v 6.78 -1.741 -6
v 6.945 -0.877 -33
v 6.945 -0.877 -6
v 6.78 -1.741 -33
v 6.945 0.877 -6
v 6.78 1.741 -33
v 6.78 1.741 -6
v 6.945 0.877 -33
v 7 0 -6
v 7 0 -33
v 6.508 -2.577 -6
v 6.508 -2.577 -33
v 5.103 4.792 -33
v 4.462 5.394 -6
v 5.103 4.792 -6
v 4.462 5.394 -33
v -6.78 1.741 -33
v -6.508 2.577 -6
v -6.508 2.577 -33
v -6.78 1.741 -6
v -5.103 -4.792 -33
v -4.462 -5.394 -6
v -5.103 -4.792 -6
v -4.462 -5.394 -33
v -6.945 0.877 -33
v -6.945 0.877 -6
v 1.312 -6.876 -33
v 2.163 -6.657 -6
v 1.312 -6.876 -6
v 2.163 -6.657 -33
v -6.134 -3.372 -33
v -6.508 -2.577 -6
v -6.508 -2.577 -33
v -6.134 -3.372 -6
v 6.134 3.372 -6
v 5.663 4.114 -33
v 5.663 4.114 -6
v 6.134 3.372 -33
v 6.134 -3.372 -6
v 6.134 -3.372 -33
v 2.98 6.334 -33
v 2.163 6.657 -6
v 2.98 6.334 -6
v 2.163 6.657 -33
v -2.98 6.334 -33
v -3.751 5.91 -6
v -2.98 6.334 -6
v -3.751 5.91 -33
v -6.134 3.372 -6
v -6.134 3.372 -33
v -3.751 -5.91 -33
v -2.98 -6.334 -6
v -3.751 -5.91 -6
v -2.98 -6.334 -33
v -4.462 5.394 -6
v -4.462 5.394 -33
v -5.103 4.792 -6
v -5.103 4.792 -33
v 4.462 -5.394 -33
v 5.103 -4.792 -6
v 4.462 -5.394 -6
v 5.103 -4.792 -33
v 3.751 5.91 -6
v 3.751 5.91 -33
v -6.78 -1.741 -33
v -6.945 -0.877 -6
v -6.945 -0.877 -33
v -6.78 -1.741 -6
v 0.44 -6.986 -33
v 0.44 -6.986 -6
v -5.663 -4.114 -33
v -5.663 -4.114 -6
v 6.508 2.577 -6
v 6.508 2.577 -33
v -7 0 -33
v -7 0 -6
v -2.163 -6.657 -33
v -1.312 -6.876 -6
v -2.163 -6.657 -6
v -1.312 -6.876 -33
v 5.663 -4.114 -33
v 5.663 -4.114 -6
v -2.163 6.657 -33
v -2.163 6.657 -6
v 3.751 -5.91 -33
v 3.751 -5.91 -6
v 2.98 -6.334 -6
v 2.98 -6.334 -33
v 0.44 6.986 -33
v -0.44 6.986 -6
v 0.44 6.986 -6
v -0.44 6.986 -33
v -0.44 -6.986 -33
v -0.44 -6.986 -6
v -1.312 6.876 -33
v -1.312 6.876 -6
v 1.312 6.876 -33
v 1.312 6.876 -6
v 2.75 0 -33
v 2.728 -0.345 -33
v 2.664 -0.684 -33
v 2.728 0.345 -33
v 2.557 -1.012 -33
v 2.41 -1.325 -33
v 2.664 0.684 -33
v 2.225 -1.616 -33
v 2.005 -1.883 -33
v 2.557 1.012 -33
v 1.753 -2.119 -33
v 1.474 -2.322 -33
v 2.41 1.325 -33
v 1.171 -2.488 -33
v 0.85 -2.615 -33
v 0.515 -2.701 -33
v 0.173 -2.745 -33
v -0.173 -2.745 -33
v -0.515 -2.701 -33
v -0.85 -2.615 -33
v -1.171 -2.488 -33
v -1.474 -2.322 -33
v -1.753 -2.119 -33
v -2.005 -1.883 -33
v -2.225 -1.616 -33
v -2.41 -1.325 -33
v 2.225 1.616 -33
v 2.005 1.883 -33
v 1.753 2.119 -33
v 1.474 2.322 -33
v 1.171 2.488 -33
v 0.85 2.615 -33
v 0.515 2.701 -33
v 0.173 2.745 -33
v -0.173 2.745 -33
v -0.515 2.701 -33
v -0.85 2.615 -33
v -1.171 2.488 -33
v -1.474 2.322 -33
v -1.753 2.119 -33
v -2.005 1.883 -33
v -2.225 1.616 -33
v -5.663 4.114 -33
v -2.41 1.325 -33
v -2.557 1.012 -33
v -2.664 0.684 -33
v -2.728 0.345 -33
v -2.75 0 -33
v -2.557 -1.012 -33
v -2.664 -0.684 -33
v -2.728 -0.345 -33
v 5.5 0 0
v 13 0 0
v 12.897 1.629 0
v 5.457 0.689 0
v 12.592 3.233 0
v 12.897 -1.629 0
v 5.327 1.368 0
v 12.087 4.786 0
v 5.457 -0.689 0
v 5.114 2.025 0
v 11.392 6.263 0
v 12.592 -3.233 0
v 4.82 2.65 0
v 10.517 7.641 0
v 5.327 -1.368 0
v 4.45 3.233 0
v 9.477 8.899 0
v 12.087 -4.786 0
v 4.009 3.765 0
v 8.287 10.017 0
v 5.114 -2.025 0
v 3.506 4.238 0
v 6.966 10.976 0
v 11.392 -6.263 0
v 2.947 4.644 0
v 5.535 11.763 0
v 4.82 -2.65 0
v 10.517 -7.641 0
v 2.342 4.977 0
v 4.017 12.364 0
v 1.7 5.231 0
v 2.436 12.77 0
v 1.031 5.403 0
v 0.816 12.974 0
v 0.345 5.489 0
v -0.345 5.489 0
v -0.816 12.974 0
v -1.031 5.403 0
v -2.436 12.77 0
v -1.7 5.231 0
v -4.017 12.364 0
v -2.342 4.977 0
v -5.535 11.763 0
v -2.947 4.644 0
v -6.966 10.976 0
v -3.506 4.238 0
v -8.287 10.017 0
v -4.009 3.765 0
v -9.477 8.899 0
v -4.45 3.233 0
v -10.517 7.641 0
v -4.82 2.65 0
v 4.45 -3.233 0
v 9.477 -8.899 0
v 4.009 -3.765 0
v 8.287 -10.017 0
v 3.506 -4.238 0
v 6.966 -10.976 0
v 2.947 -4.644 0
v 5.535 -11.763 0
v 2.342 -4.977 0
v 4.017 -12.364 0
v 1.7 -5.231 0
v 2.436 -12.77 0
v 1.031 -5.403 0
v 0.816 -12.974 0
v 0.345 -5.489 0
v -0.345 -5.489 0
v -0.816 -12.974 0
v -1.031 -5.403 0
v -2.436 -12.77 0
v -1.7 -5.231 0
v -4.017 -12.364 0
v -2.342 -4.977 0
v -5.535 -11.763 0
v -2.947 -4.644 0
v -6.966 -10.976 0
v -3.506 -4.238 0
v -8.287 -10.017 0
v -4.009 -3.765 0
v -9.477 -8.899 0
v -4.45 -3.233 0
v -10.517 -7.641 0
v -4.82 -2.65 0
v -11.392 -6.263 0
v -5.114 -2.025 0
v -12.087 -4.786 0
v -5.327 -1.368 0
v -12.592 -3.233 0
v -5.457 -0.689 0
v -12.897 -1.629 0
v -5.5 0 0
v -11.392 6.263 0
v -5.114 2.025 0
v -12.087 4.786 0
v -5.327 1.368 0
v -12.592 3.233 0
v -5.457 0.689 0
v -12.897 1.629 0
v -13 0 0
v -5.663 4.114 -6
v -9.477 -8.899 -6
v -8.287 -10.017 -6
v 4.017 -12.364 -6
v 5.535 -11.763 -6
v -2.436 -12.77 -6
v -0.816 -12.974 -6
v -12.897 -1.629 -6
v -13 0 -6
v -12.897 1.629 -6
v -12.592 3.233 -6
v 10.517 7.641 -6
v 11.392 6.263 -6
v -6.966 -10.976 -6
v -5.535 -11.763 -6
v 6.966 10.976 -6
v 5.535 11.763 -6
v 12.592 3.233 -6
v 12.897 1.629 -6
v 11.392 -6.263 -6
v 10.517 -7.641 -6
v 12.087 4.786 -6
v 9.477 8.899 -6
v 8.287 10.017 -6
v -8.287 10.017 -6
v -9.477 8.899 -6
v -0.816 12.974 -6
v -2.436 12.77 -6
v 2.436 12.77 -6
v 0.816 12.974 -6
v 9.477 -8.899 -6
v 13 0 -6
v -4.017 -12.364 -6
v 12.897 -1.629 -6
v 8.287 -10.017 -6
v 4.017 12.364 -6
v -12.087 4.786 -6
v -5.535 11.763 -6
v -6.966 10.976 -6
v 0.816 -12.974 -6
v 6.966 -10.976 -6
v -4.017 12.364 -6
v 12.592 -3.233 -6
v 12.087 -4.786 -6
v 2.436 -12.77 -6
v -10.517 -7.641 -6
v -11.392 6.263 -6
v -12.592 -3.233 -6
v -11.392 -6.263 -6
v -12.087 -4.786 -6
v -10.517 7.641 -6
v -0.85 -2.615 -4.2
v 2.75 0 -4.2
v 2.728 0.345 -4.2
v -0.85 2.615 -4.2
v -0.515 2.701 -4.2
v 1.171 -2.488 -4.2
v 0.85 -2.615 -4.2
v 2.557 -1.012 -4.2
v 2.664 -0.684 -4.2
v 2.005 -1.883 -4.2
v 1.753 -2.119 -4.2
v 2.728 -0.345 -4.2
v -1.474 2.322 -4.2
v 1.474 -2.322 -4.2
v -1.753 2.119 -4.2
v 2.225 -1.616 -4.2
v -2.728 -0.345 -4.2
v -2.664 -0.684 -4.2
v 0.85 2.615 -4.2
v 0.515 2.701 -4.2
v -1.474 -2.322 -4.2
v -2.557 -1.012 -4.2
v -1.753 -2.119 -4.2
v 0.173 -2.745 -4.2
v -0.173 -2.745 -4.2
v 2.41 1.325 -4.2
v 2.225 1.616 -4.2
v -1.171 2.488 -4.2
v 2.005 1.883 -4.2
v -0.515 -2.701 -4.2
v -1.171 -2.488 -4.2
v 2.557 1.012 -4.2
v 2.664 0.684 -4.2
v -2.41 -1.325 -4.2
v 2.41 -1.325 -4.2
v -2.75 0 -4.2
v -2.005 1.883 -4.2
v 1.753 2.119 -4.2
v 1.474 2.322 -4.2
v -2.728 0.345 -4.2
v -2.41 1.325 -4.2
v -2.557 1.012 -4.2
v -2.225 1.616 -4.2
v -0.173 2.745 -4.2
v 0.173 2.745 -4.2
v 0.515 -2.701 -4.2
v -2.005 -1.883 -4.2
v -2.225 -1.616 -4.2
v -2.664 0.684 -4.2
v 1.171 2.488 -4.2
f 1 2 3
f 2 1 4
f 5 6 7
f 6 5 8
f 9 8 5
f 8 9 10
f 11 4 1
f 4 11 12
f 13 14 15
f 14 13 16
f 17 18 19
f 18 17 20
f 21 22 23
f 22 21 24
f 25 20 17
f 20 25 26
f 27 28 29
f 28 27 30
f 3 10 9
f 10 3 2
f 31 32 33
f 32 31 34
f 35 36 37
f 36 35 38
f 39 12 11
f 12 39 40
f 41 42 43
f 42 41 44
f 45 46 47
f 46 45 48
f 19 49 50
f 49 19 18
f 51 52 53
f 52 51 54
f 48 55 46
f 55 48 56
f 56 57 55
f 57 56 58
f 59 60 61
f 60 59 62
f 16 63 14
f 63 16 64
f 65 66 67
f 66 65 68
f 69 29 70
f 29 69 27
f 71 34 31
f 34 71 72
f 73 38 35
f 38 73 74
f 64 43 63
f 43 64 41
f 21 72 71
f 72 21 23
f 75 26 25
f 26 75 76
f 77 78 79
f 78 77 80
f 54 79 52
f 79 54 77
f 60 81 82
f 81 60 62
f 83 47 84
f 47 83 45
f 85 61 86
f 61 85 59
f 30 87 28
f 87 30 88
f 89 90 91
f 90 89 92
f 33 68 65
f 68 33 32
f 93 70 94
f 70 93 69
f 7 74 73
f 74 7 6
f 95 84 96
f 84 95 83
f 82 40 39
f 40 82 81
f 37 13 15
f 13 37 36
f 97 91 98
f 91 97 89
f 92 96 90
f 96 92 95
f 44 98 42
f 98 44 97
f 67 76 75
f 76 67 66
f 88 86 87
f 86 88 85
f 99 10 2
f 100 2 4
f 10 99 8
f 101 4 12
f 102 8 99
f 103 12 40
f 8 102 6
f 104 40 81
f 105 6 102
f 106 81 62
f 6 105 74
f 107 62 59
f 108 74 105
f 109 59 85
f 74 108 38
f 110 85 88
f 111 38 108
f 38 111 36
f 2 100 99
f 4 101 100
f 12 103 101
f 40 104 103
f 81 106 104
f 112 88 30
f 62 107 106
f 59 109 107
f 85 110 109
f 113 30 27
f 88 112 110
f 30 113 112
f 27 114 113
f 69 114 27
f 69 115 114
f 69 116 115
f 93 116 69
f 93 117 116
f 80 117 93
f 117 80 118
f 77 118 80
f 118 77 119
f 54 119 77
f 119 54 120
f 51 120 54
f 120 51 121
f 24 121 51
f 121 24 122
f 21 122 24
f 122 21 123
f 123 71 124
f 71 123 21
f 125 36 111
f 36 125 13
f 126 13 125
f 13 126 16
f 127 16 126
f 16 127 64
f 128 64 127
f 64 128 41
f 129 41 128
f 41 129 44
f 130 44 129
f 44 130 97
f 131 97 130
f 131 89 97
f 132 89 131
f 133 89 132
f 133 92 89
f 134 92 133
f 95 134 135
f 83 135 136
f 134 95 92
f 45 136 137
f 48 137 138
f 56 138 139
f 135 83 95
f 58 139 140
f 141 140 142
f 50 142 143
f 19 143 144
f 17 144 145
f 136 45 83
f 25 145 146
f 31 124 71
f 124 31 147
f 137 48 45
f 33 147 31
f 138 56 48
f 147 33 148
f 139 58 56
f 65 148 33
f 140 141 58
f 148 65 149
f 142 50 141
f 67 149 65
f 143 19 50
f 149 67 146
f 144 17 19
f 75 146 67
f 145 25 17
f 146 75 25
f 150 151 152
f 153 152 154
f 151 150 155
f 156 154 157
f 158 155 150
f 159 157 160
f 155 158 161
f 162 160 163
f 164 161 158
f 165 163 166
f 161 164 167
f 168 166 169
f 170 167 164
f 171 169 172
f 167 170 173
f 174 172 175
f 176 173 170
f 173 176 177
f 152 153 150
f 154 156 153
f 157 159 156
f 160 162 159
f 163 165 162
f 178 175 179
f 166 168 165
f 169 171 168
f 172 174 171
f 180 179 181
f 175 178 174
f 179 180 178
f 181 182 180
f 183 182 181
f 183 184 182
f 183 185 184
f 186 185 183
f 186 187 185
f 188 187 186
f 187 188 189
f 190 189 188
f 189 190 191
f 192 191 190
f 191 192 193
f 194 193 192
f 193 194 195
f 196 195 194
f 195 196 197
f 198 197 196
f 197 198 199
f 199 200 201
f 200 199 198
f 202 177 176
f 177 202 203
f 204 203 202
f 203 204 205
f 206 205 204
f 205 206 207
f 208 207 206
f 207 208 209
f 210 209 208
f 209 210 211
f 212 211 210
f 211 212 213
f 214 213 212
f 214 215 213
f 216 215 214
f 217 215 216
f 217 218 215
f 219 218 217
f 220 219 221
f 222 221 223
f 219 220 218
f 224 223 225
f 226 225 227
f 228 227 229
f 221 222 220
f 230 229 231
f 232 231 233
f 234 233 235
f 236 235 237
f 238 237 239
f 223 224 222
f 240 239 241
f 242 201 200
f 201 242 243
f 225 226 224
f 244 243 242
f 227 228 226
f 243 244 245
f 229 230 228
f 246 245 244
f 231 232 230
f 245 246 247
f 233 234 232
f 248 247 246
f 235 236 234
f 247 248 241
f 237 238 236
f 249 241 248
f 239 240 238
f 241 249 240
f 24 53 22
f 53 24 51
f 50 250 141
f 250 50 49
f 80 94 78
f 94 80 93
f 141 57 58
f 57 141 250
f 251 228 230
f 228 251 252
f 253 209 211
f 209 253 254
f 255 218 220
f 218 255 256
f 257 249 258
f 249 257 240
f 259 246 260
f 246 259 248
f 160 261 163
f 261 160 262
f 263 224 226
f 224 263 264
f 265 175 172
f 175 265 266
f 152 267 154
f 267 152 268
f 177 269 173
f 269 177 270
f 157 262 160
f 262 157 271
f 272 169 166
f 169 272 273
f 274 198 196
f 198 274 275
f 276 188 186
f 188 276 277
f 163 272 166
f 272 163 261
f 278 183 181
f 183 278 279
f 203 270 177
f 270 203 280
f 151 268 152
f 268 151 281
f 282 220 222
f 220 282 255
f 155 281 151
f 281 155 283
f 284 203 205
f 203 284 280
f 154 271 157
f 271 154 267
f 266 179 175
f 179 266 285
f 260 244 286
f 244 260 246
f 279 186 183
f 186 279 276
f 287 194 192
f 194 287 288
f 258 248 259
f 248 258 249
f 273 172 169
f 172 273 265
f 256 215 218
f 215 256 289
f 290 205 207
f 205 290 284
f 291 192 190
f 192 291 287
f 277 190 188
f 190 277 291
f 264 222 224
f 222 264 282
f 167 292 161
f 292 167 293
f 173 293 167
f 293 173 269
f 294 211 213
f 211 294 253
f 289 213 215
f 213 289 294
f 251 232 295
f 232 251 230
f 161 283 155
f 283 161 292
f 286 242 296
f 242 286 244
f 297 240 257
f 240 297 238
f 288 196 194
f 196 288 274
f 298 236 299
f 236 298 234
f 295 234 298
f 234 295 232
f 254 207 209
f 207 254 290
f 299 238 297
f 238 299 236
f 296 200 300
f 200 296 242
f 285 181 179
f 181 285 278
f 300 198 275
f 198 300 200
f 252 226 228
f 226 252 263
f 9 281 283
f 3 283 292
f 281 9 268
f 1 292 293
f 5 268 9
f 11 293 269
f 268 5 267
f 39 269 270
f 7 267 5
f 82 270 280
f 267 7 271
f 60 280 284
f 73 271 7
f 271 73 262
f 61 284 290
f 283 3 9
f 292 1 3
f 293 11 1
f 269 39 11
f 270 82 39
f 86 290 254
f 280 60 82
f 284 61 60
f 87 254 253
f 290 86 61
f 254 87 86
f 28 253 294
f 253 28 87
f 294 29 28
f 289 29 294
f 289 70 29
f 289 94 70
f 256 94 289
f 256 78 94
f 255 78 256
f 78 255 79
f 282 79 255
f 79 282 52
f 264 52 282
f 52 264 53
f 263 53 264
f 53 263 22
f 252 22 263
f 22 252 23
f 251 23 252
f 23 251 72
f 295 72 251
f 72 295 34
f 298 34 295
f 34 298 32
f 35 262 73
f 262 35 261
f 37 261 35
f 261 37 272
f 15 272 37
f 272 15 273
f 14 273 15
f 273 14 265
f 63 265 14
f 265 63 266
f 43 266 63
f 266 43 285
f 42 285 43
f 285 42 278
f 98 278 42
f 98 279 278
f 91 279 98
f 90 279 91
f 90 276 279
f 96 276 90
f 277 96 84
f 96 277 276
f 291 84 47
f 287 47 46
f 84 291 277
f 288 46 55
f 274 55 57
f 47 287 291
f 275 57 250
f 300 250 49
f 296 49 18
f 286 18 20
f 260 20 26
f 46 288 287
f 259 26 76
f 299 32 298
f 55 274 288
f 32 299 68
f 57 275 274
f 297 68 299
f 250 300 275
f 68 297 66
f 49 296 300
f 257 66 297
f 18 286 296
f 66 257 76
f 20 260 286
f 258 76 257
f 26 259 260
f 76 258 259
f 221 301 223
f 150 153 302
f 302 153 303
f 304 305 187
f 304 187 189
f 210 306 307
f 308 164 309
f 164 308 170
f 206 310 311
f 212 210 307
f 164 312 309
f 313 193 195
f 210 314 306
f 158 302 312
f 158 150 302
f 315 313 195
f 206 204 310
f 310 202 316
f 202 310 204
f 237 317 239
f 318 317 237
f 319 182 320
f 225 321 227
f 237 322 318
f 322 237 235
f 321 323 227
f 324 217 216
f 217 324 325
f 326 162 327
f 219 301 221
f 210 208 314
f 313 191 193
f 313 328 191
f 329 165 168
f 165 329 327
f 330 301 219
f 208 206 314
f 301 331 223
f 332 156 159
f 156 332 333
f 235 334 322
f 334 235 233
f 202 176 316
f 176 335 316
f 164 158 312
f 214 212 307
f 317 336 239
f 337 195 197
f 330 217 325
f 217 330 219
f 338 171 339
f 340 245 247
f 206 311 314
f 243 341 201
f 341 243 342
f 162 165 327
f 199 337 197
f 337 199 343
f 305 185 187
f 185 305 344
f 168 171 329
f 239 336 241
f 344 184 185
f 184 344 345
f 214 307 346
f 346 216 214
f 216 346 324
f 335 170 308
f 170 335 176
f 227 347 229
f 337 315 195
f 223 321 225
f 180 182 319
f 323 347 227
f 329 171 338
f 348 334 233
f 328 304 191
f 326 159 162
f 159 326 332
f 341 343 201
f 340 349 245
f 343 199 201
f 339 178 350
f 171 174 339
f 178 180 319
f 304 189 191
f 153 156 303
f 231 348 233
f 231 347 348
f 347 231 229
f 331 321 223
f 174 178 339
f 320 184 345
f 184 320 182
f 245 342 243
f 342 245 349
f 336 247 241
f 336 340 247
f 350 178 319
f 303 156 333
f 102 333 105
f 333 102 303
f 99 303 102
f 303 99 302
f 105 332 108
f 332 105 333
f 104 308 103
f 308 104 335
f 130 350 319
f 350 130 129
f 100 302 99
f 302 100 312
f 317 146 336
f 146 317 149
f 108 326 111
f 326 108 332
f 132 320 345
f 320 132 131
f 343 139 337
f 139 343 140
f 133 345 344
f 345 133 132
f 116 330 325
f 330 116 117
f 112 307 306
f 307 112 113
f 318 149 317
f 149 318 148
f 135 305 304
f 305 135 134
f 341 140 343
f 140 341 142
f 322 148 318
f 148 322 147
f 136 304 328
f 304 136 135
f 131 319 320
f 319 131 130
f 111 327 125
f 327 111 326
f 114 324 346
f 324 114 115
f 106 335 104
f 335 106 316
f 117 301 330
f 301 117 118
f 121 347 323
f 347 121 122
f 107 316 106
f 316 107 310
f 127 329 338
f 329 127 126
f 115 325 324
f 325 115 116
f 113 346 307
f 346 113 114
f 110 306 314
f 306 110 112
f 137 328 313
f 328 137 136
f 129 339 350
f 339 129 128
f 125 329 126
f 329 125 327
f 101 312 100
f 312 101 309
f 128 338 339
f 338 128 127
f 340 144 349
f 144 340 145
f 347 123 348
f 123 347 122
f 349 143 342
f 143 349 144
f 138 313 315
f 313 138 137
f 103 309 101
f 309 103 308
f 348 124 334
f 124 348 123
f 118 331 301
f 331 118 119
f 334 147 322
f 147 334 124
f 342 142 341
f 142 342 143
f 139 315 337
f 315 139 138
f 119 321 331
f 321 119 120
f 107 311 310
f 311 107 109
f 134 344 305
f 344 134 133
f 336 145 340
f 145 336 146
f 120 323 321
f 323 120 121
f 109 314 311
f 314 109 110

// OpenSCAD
$fn = 50;


difference() {
	union() {
		translate(v = [0, 0, -33.0000000000]) {
			cylinder(h = 33, r = 7.0000000000);
		}
		translate(v = [0, 0, -6.0000000000]) {
			cylinder(h = 6, r = 13.0000000000);
		}
	}
	union() {
		translate(v = [0, 0, 0]) {
			rotate(a = [0, 0, 0]) {
				difference() {
					union() {
						#translate(v = [0, 0, -33.0000000000]) {
							cylinder(h = 33, r = 2.2500000000);
						}
						#translate(v = [0, 0, -4.2000000000]) {
							cylinder(h = 4.2000000000, r = 7.0000000000, r1 = 2.7500000000, r2 = 5.5000000000);
						}
						#translate(v = [0, 0, -33.0000000000]) {
							cylinder(h = 33, r = 2.7500000000);
						}
						#translate(v = [0, 0, -33.0000000000]) {
							cylinder(h = 33, r = 2.2500000000);
						}
					}
					union();
				}
			}
		}
	}
}
